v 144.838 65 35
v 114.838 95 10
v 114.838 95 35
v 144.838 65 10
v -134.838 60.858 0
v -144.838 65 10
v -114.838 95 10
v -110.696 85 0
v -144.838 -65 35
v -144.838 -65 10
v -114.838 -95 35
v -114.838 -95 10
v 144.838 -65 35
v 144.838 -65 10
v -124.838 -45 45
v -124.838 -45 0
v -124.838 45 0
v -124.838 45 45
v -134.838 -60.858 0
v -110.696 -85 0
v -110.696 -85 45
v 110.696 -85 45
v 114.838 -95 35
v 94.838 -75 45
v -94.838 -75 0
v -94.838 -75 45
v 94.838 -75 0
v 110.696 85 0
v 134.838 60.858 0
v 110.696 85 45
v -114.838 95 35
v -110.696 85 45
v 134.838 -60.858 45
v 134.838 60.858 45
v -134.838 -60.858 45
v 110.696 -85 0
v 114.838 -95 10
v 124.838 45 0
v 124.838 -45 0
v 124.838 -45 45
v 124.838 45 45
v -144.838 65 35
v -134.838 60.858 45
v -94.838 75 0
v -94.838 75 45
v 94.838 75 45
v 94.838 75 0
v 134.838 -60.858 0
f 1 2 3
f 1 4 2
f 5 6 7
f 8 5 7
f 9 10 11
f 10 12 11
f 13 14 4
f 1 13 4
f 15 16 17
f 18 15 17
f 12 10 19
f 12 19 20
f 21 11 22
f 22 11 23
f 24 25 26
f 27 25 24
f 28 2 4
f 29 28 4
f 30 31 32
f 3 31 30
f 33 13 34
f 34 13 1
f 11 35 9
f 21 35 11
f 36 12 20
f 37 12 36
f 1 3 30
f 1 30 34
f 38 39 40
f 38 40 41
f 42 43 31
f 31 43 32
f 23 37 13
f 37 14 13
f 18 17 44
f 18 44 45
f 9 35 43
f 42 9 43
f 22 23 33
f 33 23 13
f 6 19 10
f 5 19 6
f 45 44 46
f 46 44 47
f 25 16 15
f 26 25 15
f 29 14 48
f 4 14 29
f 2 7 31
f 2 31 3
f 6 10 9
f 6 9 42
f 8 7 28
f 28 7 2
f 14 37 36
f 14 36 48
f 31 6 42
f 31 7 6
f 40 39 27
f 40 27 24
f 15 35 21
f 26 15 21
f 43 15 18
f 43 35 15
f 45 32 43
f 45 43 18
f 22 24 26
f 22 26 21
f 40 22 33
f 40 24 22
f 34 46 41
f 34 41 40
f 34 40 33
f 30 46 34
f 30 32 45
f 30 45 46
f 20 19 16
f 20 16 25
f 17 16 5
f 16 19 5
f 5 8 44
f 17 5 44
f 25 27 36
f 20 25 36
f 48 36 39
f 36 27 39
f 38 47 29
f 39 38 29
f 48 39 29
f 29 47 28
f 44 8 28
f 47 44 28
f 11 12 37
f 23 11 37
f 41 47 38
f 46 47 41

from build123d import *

# Parameters (mm, degrees)
ESBO_O1_W                = 289.676219128
ESBO_O1_H                = 190
ESBO_O1_W_2              = 249.676219128
ESBO_O1_H_2              = 150
RESSALTO_EXTRUS_O1_DEPTH = 45
CHANFRO1_SIZE            = 30
CHANFRO2_SIZE            = 10


with BuildPart() as part:
    # Esboço1 → Ressalto-extrusão1 (new body)
    with BuildSketch(Plane.XY):
        Rectangle(ESBO_O1_W, ESBO_O1_H)
        Rectangle(ESBO_O1_W_2, ESBO_O1_H_2, mode=Mode.SUBTRACT)
    extrude(amount=RESSALTO_EXTRUS_O1_DEPTH)

    # Chanfro1
    chanfro1_edges = [part.edges().sort_by_distance(p)[0] for p in [
        (124.838109564, -75, 22.5),
        (124.838109564, 75, 22.5),
        (-124.838109564, 75, 22.5),
        (-124.838109564, -75, 22.5),
        (-144.838109564, 95, 22.5),
        (144.838109564, 95, 22.5),
        (144.838109564, -95, 22.5),
        (-144.838109564, -95, 22.5),
    ]]
    chamfer(chanfro1_edges, length=CHANFRO1_SIZE)

    # Chanfro2
    chanfro2_edges = [part.edges().sort_by_distance(p)[0] for p in [
        (144.838109564, 0, 0),
        (144.838109564, 0, 45),
        (-144.838109564, 0, 0),
        (0, 95, 0),
        (0, -95, 0),
        (-129.838109564, 80, 0),
        (-129.838109564, -80, 0),
        (129.838109564, 80, 0),
        (129.838109564, -80, 0),
        (0, -95, 45),
        (-144.838109564, 0, 45),
        (0, 95, 45),
        (-129.838109564, 80, 45),
        (-129.838109564, -80, 45),
        (129.838109564, 80, 45),
        (129.838109564, -80, 45),
    ]]
    chamfer(chanfro2_edges, length=CHANFRO2_SIZE)


solid = part.part
